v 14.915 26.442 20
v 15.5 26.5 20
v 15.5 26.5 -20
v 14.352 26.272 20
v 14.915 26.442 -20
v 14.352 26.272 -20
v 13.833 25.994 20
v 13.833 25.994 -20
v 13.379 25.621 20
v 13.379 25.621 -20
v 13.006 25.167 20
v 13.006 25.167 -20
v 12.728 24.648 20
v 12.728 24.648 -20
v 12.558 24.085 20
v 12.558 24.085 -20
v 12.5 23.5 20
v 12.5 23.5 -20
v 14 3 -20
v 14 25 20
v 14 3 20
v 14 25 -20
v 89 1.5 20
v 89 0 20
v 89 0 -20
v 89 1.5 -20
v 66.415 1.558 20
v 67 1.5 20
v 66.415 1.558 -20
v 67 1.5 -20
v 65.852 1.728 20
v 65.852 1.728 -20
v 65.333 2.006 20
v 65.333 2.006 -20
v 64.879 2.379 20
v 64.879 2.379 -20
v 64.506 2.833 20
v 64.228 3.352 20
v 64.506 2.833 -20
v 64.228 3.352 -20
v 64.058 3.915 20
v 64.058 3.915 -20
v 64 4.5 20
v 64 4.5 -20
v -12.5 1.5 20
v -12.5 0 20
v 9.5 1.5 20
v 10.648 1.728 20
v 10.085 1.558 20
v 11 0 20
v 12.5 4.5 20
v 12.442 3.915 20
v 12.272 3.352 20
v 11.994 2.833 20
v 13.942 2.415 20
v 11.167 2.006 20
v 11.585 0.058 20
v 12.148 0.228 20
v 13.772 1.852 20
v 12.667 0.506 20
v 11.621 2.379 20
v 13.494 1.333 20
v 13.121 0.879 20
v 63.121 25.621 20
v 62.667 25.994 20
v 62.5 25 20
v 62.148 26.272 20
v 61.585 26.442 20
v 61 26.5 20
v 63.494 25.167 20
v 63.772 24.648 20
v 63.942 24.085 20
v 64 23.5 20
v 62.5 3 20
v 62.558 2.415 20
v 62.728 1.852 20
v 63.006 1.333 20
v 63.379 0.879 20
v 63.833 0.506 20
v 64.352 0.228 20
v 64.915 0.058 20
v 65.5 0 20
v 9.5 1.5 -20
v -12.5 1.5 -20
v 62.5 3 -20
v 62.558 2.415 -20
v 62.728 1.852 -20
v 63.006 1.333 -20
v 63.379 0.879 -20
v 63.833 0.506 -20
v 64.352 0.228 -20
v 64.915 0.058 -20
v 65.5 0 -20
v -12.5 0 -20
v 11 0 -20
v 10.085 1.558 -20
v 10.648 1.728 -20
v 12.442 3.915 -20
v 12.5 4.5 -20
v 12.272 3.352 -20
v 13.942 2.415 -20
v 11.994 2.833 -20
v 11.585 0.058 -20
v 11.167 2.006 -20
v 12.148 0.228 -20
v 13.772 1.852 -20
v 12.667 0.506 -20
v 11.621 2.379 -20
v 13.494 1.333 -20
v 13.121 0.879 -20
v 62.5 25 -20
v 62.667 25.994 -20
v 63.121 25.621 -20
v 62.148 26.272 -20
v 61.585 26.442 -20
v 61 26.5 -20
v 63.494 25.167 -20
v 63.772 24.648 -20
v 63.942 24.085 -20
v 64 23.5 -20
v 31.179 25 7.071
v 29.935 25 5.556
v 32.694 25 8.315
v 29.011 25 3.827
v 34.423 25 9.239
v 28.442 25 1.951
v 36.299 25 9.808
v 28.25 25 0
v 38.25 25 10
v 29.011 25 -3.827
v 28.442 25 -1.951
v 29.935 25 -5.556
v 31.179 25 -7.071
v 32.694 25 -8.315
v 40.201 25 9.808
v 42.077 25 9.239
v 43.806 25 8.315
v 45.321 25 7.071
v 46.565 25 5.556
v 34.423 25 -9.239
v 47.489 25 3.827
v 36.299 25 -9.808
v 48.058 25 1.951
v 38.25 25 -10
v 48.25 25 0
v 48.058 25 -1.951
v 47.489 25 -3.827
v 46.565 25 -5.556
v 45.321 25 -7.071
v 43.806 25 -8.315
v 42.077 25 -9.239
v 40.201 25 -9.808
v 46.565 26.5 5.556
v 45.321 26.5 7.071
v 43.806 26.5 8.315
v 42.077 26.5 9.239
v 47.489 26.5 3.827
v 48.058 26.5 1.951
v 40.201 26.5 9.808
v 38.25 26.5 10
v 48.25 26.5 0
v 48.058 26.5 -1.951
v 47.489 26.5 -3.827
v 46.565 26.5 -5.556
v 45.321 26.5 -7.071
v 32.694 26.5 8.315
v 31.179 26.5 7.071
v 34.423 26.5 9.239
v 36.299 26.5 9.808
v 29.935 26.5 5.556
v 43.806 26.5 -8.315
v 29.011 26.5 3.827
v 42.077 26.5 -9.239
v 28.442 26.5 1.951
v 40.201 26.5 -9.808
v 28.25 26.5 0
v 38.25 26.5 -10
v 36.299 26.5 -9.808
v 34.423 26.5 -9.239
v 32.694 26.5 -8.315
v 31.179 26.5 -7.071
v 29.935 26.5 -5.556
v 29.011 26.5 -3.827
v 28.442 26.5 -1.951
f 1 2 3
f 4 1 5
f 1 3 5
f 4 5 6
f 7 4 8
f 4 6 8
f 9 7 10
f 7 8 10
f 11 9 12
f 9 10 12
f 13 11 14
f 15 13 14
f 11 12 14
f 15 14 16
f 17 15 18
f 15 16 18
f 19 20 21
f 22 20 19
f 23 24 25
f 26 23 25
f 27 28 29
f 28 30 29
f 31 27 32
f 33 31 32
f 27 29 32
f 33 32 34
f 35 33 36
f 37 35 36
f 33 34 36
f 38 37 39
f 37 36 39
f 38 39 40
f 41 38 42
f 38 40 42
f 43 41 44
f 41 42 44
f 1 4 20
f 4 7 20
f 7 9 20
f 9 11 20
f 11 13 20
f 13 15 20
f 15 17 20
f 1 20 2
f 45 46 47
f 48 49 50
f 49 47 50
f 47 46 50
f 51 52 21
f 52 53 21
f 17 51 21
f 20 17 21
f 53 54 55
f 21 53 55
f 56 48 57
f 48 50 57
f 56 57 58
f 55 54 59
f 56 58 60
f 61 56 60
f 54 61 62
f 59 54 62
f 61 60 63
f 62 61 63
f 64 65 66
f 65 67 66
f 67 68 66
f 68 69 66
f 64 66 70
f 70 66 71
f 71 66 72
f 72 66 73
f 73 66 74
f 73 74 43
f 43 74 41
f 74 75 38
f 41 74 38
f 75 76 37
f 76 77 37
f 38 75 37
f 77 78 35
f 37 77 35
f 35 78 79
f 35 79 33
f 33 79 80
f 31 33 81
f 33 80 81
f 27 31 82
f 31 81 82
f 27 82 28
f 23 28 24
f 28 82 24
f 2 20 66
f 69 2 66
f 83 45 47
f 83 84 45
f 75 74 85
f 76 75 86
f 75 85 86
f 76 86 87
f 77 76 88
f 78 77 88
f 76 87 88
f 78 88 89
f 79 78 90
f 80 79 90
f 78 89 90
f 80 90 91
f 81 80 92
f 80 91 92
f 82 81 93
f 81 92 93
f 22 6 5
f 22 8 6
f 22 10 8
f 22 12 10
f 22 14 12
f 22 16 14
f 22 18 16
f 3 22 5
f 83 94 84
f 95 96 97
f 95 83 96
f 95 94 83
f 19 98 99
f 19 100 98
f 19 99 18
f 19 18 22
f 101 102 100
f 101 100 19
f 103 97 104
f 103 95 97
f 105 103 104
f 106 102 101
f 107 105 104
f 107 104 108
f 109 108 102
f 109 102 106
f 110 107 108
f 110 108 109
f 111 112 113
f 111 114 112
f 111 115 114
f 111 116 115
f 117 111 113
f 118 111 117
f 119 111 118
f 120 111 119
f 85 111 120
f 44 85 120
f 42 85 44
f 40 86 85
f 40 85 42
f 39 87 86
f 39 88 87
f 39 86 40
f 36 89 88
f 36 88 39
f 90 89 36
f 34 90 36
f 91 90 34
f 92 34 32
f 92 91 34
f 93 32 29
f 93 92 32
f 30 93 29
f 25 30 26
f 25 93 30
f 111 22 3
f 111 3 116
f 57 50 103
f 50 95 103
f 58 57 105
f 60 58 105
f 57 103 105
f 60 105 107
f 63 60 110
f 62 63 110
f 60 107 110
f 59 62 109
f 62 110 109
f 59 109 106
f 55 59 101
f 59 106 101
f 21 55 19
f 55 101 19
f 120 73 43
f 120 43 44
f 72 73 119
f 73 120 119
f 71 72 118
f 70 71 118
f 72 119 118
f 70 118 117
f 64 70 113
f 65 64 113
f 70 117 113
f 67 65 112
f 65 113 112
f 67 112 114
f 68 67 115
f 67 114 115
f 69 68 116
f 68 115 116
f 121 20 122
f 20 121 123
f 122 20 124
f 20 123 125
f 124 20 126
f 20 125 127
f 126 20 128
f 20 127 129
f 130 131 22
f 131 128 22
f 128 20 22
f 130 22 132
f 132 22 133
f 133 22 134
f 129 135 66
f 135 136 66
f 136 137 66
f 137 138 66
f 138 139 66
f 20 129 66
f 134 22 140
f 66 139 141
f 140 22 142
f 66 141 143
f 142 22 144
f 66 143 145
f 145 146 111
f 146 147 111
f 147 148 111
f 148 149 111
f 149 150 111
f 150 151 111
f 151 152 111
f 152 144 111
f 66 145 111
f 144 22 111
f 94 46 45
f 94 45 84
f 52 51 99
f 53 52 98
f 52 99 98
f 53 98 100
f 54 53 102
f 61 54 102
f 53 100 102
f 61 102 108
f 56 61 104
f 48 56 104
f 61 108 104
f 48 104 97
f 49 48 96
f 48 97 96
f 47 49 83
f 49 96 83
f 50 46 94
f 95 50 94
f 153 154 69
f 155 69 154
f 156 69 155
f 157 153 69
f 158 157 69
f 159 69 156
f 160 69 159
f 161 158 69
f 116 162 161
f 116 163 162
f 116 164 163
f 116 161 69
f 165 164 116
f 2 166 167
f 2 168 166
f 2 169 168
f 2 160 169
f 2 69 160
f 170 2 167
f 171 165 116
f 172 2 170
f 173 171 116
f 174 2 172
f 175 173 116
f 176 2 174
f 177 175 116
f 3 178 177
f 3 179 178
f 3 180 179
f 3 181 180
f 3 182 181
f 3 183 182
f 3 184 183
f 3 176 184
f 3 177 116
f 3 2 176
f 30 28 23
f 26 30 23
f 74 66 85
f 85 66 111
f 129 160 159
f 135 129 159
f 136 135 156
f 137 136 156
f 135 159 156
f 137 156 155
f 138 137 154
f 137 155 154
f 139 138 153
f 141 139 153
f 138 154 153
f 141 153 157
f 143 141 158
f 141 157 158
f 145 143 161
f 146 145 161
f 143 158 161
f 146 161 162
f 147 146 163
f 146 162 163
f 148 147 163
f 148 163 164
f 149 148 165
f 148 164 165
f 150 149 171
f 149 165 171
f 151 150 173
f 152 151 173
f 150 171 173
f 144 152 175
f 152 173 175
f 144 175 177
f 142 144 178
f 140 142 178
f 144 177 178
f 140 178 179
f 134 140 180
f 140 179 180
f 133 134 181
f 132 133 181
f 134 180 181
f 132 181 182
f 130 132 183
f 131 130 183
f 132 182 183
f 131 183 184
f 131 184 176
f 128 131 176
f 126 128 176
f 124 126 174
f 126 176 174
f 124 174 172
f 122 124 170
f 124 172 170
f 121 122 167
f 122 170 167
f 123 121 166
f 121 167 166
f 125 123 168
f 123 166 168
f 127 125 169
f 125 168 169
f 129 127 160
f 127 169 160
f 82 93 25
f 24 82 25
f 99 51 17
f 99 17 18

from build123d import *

# Parameters (mm, degrees)
SKETCH1_W           = 25
SKETCH1_H           = 40
BOSS_EXTRUDE1_DEPTH = 1.5
SKETCH5_W           = 40
SKETCH5_H           = 25
BOSS_EXTRUDE3_DEPTH = 1.5
SKETCH6_W           = 50
SKETCH6_H           = 40
BOSS_EXTRUDE4_DEPTH = 1.5
SKETCH7_W           = 40
SKETCH7_H           = 26.5
BOSS_EXTRUDE5_DEPTH = 1.5
SKETCH9_W           = 25
SKETCH9_H           = 40
BOSS_EXTRUDE6_DEPTH = 1.5
FILLET2_R           = 3
SKETCH10_R          = 10
CUT_EXTRUDE1_DEPTH  = 1.5
FILLET3_R           = 3


with BuildPart() as part:
    # Sketch1 → Boss-Extrude1 (new body)
    with BuildSketch(Plane(origin=(0, 0, 0), x_dir=(1, 0, 0), z_dir=(0, 1, 0))):
        Rectangle(SKETCH1_W, SKETCH1_H)
    extrude(amount=BOSS_EXTRUDE1_DEPTH)

    # Sketch5 → Boss-Extrude3 (add)
    with BuildSketch(Plane(origin=(12.5, 0, 0), x_dir=(0, 0, -1), z_dir=(1, 0, 0))):
        with Locations((0, 12.5)):
            Rectangle(SKETCH5_W, SKETCH5_H)
    extrude(amount=BOSS_EXTRUDE3_DEPTH)

    # Sketch6 → Boss-Extrude4 (add)
    with BuildSketch(Plane(origin=(0, 25, 0), x_dir=(1, 0, 0), z_dir=(0, 1, 0))):
        with Locations((37.5, 0)):
            Rectangle(SKETCH6_W, SKETCH6_H)
    extrude(amount=BOSS_EXTRUDE4_DEPTH)

    # Sketch7 → Boss-Extrude5 (add)
    with BuildSketch(Plane(origin=(62.5, 0, 0), x_dir=(0, 0, -1), z_dir=(1, 0, 0))):
        with Locations((0, 13.25)):
            Rectangle(SKETCH7_W, SKETCH7_H)
    extrude(amount=BOSS_EXTRUDE5_DEPTH)

    # Sketch9 → Boss-Extrude6 (add)
    with BuildSketch(Plane(origin=(0, 0, 0), x_dir=(1, 0, 0), z_dir=(0, 1, 0))):
        with Locations((76.5, 0)):
            Rectangle(SKETCH9_W, SKETCH9_H)
    extrude(amount=BOSS_EXTRUDE6_DEPTH)

    # Fillet2
    fillet2_edges = [part.edges().sort_by_distance(p)[0] for p in [
        (14, 0, 0),
        (12.5, 26.5, 0),
        (62.5, 0, 0),
        (64, 26.5, 0),
    ]]
    fillet(fillet2_edges, radius=FILLET2_R)

    # Sketch10 → Cut-Extrude1 (cut)
    with BuildSketch(Plane(origin=(0, 26.5, 0), x_dir=(1, 0, 0), z_dir=(0, 1, 0))):
        with Locations(Location((38.25, 0, 0), (0, 0, 270))):
            Circle(SKETCH10_R)
    extrude(amount=-CUT_EXTRUDE1_DEPTH, mode=Mode.SUBTRACT)

    # Fillet3
    fillet3_edges = [part.edges().sort_by_distance(p)[0] for p in [
        (12.5, 1.5, 0),
        (64, 1.5, 0),
    ]]
    fillet(fillet3_edges, radius=FILLET3_R)


solid = part.part
